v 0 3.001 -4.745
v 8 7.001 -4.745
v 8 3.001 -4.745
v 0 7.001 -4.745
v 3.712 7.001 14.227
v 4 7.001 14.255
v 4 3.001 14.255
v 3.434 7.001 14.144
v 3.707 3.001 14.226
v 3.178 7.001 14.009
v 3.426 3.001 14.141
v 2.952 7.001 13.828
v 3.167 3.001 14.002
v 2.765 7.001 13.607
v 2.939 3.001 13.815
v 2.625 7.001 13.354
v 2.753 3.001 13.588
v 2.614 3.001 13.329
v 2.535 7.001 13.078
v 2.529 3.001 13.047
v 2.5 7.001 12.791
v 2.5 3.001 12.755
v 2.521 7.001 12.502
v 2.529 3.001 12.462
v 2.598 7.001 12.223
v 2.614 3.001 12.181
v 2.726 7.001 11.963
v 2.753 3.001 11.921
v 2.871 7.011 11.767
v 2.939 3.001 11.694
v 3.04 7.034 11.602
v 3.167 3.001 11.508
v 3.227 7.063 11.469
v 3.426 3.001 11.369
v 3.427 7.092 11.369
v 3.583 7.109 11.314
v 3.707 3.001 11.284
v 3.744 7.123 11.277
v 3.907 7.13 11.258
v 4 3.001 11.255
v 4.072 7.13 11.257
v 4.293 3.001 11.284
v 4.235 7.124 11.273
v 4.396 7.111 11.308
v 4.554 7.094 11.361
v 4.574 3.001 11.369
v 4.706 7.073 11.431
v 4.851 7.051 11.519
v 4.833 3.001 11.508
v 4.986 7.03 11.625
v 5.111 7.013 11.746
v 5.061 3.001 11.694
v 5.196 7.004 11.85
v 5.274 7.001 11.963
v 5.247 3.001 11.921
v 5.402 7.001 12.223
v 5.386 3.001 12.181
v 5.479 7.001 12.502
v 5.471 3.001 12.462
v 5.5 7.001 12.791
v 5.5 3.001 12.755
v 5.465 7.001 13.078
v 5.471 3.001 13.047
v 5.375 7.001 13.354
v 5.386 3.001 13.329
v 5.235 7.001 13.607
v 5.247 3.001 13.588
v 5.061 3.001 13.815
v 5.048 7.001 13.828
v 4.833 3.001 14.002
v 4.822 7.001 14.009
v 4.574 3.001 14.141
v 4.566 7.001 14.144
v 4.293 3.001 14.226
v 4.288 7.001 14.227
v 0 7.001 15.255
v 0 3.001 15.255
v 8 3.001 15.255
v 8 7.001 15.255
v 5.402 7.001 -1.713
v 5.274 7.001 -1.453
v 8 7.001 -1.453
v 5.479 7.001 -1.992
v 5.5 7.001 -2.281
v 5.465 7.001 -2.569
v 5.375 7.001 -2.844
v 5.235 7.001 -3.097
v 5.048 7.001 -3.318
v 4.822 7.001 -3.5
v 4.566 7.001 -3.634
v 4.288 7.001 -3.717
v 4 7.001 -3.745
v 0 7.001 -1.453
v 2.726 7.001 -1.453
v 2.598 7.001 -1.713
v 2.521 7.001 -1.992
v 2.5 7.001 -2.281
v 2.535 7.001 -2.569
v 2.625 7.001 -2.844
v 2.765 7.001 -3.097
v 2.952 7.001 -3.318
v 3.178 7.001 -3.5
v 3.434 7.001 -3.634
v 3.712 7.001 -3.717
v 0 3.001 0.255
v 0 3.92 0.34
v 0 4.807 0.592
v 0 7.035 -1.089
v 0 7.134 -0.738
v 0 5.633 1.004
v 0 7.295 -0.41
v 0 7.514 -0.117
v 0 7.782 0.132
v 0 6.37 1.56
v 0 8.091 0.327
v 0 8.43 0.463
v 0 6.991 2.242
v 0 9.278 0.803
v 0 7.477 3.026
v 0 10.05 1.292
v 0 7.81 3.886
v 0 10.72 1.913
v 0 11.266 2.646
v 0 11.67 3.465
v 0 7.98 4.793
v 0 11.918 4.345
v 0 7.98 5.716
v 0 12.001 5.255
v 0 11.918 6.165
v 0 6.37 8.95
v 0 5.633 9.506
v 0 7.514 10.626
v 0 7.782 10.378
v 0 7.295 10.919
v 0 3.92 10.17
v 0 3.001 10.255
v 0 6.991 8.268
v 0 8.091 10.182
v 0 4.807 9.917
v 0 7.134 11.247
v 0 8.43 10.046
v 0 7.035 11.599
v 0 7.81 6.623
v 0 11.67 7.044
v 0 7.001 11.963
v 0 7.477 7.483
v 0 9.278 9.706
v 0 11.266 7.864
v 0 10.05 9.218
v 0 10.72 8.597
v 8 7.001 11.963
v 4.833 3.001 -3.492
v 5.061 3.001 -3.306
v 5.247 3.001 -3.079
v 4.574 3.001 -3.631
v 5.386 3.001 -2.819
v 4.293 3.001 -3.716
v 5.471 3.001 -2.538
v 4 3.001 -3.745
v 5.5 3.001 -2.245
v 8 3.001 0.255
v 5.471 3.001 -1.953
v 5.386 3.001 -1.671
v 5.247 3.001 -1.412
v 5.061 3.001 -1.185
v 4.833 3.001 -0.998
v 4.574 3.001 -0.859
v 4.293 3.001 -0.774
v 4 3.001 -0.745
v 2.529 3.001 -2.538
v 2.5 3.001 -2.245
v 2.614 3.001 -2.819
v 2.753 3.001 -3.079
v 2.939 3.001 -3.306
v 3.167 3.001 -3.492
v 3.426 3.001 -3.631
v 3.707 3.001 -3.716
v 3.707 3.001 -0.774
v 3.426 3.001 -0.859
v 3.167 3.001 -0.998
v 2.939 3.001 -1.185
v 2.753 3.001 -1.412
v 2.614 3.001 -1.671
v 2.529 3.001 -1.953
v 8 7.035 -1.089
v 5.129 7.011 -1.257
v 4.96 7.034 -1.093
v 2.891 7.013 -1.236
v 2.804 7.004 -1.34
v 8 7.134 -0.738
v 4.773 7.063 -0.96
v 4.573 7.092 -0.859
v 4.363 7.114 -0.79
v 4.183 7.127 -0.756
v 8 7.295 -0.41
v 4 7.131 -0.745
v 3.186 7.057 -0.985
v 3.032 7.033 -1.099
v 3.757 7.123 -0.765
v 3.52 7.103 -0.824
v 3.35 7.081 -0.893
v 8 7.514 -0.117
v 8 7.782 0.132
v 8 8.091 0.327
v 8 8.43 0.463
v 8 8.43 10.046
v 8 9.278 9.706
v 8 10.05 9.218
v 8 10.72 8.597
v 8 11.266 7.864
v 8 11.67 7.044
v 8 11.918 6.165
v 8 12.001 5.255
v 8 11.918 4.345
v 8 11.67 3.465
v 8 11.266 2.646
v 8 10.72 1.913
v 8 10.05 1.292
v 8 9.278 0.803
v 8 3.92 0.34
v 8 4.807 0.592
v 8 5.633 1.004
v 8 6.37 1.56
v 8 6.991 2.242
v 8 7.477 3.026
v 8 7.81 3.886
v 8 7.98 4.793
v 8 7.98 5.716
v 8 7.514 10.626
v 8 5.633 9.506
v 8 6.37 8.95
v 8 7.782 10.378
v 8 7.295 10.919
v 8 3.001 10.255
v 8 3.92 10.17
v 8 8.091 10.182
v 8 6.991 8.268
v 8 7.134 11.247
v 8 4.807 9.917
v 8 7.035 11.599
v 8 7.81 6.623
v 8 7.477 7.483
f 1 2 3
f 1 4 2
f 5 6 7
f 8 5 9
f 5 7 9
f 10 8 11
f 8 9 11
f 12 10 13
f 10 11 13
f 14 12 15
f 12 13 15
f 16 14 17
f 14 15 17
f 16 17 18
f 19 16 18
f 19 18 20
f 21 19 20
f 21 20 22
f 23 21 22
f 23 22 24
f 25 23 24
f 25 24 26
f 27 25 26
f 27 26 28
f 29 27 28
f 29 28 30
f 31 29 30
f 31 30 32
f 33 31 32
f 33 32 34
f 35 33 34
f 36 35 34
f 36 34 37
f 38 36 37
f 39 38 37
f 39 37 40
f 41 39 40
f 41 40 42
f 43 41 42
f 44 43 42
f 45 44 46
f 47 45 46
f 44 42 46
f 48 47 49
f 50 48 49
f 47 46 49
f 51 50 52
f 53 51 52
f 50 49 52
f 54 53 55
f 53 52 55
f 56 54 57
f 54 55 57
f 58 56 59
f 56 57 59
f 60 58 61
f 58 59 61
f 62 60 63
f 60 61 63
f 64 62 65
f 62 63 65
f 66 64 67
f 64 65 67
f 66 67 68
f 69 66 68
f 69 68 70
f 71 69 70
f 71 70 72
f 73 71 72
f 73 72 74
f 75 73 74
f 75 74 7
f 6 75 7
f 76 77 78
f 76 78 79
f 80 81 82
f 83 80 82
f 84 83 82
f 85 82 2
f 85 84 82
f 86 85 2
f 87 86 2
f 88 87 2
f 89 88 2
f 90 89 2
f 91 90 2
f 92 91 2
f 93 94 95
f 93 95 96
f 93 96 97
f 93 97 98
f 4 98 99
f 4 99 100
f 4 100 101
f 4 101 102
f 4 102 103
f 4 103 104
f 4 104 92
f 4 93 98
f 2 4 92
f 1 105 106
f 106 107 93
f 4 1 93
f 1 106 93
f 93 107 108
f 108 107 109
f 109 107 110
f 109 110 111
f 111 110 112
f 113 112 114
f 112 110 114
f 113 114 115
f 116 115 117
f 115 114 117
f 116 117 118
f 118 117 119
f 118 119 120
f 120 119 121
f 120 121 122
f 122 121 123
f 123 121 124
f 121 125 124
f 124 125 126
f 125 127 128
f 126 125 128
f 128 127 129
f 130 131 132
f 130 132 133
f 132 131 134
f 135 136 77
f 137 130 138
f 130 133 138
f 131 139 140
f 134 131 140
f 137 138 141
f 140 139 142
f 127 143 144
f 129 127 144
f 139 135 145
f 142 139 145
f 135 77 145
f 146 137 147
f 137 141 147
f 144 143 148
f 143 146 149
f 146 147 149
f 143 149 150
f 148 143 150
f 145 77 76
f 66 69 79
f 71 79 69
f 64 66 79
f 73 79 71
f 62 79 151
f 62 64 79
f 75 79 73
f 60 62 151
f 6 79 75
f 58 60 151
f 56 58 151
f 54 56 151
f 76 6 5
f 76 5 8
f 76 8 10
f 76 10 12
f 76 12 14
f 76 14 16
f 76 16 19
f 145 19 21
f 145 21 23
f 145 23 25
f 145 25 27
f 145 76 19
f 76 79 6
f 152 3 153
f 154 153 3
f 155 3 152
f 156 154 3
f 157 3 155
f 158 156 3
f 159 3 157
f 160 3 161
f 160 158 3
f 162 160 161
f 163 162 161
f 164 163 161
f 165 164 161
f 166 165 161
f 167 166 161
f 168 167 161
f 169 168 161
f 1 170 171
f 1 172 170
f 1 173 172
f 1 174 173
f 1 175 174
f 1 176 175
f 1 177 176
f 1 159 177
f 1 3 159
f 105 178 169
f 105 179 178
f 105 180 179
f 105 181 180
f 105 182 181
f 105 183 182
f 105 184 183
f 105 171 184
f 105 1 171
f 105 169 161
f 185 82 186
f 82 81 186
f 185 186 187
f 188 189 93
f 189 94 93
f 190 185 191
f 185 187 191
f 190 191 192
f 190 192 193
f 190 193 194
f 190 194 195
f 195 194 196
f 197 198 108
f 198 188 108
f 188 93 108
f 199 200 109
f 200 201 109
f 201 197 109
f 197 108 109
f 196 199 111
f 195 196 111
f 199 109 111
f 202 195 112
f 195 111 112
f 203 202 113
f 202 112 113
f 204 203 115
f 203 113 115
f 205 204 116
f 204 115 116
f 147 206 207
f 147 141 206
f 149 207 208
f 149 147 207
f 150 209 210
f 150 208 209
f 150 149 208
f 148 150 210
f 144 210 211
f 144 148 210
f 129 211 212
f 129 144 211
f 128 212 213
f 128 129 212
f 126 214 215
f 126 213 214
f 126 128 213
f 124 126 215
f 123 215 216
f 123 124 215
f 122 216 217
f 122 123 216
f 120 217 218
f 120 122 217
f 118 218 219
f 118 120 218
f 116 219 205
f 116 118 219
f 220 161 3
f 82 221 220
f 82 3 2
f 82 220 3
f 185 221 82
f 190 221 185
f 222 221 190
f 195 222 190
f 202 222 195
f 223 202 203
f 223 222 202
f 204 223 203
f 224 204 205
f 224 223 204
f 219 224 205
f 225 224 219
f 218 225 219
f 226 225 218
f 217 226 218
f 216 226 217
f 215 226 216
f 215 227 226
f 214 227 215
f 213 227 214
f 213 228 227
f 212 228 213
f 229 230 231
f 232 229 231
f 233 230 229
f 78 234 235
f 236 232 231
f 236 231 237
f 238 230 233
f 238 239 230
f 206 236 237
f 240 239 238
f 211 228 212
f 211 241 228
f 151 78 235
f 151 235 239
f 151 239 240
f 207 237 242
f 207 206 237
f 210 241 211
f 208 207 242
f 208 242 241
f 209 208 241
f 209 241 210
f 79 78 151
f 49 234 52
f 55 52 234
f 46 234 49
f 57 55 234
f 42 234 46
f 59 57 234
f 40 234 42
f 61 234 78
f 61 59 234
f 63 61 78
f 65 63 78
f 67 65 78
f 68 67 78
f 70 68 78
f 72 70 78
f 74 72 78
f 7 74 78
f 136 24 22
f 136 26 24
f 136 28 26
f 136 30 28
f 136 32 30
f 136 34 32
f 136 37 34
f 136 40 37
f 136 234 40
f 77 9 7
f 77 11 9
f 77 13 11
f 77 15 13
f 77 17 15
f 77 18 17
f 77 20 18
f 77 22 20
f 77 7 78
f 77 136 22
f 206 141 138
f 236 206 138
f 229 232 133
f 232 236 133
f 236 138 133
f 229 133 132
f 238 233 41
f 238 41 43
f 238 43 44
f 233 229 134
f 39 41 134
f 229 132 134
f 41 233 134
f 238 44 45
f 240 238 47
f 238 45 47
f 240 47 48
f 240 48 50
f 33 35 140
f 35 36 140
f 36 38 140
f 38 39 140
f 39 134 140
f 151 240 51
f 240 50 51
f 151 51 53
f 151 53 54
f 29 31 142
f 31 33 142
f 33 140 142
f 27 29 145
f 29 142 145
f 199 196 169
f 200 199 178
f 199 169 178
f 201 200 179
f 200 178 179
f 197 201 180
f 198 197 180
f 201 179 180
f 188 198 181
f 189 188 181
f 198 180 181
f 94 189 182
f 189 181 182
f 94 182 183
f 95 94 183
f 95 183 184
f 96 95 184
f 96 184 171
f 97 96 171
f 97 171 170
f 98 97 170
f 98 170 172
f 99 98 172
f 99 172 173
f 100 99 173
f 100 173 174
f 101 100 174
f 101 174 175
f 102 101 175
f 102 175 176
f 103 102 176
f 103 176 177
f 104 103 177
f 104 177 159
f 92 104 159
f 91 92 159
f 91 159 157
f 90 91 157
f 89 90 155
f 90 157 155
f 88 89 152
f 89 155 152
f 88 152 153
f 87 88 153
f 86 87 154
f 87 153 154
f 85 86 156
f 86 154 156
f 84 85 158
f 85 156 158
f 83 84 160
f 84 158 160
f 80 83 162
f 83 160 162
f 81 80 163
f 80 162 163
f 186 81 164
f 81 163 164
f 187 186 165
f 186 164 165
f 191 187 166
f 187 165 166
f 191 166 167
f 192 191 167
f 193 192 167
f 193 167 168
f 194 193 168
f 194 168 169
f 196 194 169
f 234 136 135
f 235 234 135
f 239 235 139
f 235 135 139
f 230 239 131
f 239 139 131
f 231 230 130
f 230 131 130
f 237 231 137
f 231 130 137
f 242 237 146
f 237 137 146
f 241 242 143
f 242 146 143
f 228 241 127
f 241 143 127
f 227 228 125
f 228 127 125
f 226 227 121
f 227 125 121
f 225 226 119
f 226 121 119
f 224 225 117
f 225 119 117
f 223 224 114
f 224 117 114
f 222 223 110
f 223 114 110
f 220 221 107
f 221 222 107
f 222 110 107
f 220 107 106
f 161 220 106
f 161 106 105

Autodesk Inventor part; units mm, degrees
ref_plane "YZ Plane" through (0, 0, 0) normal (1, 0, 0) x (0, 1, 0)
ref_plane "XZ Plane" through (0, 0, 0) normal (0, 1, 0) x (-1, 0, 0)
ref_plane "XY Plane" through (0, 0, 0) normal (0, 0, 1) x (1, 0, 0)
sketch "Skizze1" plane through (0, 0, 0) normal (1, 0, 0) x (0, 1, 0)
  line L0 (3.0012, 15.2548) -> (7.0012, 15.2548)
  line L1 (7.0012, -4.7452) -> (3.0012, -4.7452)
  arc A0 (3.0012, 0.2548) -> (3.0012, 10.2548) centre (3.0012, 5.2548) ccw
  arc A1 (7.0012, 0.2548) -> (7.0012, 10.2548) centre (7.0012, 5.2548) ccw
  line L2 (3.0012, -4.7452) -> (3.0012, 0.2548)
  line L3 (3.0012, 10.2548) -> (3.0012, 15.2548)
  line L4 (7.0012, 15.2548) -> (7.0012, 10.2548)
  line L5 (7.0012, 0.2548) -> (7.0012, -4.7452)
  point P0 (0, 0)
  dimension "d0" = 4
  dimension "d1" = 20
  dimension "d3" = 10
extrude "Extrusion1" add sketch "Skizze1" along normal blind 8
sketch "Skizze2" plane through (0, 7.0012, 15.2548) normal (0, 1, 0) x (1, 0, 0)
  line L0 (0, 0) -> (8, 0) projected
  line L1 (0, 20) -> (8, 20) projected
  line L2 (8, 20) -> (8, 15) projected
  line L3 (8, 5) -> (8, 0) projected
  point P0 (0, 15.2548)
  point P1 (4, 2.5)
  point P2 (4, 17.5)
  point P3 (4, 2.5)
  dimension "d6" = 2.5
  dimension "d7" = 2.5
  dimension "d8" = 4
  dimension "d9" = 4
hole "Bohrung1" at (4, 7.0012, 12.7548) at (4, 7.0012, -2.2452) direction (0, -1, 0) diameter 3 depth 8 tip angle 118
fillet "Rundung1" radius 2 2 edges at (4, 7.0012, 10.2548) (4, 7.0012, 0.2548)
properties part number "Klemme"
